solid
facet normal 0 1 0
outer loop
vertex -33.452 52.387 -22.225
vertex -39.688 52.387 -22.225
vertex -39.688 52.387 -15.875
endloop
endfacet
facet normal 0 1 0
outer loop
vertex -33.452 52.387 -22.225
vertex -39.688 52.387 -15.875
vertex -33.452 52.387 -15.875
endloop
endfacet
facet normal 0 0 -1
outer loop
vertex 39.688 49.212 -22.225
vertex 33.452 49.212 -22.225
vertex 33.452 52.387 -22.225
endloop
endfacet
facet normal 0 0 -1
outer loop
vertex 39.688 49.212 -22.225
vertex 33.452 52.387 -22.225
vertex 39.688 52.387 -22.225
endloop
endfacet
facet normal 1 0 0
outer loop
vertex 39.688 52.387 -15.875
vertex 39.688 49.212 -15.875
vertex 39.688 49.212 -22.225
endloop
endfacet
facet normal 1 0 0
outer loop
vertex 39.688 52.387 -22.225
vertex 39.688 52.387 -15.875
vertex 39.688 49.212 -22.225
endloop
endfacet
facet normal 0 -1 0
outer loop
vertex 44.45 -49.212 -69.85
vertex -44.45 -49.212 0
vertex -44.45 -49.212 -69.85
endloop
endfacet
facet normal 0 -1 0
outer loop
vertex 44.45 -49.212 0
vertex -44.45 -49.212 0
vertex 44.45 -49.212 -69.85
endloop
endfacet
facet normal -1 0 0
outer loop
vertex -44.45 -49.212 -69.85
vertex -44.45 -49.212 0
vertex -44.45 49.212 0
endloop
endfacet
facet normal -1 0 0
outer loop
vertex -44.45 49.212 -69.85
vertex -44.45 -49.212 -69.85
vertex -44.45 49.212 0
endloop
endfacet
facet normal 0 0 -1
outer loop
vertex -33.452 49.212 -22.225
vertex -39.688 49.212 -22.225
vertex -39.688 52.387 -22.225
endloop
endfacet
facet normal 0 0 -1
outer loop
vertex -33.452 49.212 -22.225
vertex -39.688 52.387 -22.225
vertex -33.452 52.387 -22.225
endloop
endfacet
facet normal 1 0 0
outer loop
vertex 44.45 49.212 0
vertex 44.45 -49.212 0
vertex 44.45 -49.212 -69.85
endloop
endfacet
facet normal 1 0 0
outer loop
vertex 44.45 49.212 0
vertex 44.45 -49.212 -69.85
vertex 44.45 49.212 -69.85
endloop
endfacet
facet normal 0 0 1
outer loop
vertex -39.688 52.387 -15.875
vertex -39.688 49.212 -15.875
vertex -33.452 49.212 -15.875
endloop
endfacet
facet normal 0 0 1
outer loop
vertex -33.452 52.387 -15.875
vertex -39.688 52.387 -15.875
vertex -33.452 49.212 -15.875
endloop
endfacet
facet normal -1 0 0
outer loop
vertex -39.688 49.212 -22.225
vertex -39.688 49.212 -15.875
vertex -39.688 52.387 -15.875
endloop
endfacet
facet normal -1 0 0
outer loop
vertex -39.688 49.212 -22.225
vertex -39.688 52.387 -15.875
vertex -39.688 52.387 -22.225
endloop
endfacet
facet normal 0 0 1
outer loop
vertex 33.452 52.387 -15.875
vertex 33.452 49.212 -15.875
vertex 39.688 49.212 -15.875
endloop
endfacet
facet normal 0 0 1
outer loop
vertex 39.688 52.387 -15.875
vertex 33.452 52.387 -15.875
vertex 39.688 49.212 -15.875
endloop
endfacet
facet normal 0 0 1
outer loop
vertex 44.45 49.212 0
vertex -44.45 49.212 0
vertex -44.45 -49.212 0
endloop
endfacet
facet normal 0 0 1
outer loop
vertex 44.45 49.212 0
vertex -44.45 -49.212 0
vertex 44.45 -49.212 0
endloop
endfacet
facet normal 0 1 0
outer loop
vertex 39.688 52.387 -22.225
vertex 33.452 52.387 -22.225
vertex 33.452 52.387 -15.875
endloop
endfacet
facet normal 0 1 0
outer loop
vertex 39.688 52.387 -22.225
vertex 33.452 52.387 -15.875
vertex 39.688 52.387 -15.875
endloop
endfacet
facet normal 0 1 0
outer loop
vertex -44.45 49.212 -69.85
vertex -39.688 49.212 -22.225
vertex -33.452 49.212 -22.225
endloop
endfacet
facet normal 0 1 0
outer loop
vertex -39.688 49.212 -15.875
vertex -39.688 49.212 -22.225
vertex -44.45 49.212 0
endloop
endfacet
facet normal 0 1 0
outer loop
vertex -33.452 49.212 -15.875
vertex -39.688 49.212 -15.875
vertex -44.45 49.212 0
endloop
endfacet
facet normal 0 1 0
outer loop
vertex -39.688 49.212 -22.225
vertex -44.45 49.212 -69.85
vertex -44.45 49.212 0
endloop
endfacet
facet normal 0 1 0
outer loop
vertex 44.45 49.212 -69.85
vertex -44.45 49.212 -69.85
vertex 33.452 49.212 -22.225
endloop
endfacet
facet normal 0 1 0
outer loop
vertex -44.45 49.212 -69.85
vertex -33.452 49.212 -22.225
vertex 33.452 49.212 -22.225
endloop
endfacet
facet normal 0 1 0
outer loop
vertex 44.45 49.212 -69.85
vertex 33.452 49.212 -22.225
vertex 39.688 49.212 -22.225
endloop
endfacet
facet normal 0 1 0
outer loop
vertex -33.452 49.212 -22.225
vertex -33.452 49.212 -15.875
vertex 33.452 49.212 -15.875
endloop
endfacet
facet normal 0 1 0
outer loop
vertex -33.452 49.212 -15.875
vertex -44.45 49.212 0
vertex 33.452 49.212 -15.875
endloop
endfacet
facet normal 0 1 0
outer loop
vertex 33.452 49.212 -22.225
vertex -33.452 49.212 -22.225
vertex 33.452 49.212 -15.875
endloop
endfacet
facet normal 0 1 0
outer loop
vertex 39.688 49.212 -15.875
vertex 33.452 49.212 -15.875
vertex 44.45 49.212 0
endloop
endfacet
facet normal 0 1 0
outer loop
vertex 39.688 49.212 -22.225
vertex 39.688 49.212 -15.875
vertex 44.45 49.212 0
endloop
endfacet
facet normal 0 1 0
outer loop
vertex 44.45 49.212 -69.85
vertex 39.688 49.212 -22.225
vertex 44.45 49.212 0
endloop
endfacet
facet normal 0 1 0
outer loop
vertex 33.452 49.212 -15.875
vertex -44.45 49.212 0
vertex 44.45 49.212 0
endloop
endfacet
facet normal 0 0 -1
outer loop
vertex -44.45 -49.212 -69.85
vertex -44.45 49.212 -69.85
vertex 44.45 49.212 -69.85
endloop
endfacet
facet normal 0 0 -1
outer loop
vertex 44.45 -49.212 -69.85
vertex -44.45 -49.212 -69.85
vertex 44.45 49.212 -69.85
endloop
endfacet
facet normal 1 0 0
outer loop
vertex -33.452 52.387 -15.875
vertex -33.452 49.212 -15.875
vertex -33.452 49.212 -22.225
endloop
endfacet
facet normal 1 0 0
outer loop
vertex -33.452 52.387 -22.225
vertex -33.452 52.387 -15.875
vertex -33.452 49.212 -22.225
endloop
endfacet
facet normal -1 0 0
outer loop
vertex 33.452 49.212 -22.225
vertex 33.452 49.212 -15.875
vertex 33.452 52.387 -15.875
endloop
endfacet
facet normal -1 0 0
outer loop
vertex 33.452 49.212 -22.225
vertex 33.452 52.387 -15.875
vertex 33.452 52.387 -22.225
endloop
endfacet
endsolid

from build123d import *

# Parameters (mm, degrees)
SKETCH2_W           = 88.9
SKETCH2_H           = 98.425
BOSS_EXTRUDE1_DEPTH = 69.85
SKETCH3_W           = 6.235827492
SKETCH3_H           = 6.35
BOSS_EXTRUDE2_DEPTH = 3.175


with BuildPart() as part:
    # Sketch2 → Boss-Extrude1 (new body)
    with BuildSketch(Plane.XY):
        Rectangle(SKETCH2_W, SKETCH2_H)
    extrude(amount=-BOSS_EXTRUDE1_DEPTH)

    # Sketch3 → Boss-Extrude2 (add)
    with BuildSketch(Plane(origin=(0, 49.2125, 0), x_dir=(1, 0, 0), z_dir=(0, 1, 0))):
        with Locations((-36.569586254, 19.05)):
            Rectangle(SKETCH3_W, SKETCH3_H)
        with Locations((36.569586254, 19.05)):
            Rectangle(SKETCH3_W, SKETCH3_H)
    extrude(amount=BOSS_EXTRUDE2_DEPTH)


solid = part.part
